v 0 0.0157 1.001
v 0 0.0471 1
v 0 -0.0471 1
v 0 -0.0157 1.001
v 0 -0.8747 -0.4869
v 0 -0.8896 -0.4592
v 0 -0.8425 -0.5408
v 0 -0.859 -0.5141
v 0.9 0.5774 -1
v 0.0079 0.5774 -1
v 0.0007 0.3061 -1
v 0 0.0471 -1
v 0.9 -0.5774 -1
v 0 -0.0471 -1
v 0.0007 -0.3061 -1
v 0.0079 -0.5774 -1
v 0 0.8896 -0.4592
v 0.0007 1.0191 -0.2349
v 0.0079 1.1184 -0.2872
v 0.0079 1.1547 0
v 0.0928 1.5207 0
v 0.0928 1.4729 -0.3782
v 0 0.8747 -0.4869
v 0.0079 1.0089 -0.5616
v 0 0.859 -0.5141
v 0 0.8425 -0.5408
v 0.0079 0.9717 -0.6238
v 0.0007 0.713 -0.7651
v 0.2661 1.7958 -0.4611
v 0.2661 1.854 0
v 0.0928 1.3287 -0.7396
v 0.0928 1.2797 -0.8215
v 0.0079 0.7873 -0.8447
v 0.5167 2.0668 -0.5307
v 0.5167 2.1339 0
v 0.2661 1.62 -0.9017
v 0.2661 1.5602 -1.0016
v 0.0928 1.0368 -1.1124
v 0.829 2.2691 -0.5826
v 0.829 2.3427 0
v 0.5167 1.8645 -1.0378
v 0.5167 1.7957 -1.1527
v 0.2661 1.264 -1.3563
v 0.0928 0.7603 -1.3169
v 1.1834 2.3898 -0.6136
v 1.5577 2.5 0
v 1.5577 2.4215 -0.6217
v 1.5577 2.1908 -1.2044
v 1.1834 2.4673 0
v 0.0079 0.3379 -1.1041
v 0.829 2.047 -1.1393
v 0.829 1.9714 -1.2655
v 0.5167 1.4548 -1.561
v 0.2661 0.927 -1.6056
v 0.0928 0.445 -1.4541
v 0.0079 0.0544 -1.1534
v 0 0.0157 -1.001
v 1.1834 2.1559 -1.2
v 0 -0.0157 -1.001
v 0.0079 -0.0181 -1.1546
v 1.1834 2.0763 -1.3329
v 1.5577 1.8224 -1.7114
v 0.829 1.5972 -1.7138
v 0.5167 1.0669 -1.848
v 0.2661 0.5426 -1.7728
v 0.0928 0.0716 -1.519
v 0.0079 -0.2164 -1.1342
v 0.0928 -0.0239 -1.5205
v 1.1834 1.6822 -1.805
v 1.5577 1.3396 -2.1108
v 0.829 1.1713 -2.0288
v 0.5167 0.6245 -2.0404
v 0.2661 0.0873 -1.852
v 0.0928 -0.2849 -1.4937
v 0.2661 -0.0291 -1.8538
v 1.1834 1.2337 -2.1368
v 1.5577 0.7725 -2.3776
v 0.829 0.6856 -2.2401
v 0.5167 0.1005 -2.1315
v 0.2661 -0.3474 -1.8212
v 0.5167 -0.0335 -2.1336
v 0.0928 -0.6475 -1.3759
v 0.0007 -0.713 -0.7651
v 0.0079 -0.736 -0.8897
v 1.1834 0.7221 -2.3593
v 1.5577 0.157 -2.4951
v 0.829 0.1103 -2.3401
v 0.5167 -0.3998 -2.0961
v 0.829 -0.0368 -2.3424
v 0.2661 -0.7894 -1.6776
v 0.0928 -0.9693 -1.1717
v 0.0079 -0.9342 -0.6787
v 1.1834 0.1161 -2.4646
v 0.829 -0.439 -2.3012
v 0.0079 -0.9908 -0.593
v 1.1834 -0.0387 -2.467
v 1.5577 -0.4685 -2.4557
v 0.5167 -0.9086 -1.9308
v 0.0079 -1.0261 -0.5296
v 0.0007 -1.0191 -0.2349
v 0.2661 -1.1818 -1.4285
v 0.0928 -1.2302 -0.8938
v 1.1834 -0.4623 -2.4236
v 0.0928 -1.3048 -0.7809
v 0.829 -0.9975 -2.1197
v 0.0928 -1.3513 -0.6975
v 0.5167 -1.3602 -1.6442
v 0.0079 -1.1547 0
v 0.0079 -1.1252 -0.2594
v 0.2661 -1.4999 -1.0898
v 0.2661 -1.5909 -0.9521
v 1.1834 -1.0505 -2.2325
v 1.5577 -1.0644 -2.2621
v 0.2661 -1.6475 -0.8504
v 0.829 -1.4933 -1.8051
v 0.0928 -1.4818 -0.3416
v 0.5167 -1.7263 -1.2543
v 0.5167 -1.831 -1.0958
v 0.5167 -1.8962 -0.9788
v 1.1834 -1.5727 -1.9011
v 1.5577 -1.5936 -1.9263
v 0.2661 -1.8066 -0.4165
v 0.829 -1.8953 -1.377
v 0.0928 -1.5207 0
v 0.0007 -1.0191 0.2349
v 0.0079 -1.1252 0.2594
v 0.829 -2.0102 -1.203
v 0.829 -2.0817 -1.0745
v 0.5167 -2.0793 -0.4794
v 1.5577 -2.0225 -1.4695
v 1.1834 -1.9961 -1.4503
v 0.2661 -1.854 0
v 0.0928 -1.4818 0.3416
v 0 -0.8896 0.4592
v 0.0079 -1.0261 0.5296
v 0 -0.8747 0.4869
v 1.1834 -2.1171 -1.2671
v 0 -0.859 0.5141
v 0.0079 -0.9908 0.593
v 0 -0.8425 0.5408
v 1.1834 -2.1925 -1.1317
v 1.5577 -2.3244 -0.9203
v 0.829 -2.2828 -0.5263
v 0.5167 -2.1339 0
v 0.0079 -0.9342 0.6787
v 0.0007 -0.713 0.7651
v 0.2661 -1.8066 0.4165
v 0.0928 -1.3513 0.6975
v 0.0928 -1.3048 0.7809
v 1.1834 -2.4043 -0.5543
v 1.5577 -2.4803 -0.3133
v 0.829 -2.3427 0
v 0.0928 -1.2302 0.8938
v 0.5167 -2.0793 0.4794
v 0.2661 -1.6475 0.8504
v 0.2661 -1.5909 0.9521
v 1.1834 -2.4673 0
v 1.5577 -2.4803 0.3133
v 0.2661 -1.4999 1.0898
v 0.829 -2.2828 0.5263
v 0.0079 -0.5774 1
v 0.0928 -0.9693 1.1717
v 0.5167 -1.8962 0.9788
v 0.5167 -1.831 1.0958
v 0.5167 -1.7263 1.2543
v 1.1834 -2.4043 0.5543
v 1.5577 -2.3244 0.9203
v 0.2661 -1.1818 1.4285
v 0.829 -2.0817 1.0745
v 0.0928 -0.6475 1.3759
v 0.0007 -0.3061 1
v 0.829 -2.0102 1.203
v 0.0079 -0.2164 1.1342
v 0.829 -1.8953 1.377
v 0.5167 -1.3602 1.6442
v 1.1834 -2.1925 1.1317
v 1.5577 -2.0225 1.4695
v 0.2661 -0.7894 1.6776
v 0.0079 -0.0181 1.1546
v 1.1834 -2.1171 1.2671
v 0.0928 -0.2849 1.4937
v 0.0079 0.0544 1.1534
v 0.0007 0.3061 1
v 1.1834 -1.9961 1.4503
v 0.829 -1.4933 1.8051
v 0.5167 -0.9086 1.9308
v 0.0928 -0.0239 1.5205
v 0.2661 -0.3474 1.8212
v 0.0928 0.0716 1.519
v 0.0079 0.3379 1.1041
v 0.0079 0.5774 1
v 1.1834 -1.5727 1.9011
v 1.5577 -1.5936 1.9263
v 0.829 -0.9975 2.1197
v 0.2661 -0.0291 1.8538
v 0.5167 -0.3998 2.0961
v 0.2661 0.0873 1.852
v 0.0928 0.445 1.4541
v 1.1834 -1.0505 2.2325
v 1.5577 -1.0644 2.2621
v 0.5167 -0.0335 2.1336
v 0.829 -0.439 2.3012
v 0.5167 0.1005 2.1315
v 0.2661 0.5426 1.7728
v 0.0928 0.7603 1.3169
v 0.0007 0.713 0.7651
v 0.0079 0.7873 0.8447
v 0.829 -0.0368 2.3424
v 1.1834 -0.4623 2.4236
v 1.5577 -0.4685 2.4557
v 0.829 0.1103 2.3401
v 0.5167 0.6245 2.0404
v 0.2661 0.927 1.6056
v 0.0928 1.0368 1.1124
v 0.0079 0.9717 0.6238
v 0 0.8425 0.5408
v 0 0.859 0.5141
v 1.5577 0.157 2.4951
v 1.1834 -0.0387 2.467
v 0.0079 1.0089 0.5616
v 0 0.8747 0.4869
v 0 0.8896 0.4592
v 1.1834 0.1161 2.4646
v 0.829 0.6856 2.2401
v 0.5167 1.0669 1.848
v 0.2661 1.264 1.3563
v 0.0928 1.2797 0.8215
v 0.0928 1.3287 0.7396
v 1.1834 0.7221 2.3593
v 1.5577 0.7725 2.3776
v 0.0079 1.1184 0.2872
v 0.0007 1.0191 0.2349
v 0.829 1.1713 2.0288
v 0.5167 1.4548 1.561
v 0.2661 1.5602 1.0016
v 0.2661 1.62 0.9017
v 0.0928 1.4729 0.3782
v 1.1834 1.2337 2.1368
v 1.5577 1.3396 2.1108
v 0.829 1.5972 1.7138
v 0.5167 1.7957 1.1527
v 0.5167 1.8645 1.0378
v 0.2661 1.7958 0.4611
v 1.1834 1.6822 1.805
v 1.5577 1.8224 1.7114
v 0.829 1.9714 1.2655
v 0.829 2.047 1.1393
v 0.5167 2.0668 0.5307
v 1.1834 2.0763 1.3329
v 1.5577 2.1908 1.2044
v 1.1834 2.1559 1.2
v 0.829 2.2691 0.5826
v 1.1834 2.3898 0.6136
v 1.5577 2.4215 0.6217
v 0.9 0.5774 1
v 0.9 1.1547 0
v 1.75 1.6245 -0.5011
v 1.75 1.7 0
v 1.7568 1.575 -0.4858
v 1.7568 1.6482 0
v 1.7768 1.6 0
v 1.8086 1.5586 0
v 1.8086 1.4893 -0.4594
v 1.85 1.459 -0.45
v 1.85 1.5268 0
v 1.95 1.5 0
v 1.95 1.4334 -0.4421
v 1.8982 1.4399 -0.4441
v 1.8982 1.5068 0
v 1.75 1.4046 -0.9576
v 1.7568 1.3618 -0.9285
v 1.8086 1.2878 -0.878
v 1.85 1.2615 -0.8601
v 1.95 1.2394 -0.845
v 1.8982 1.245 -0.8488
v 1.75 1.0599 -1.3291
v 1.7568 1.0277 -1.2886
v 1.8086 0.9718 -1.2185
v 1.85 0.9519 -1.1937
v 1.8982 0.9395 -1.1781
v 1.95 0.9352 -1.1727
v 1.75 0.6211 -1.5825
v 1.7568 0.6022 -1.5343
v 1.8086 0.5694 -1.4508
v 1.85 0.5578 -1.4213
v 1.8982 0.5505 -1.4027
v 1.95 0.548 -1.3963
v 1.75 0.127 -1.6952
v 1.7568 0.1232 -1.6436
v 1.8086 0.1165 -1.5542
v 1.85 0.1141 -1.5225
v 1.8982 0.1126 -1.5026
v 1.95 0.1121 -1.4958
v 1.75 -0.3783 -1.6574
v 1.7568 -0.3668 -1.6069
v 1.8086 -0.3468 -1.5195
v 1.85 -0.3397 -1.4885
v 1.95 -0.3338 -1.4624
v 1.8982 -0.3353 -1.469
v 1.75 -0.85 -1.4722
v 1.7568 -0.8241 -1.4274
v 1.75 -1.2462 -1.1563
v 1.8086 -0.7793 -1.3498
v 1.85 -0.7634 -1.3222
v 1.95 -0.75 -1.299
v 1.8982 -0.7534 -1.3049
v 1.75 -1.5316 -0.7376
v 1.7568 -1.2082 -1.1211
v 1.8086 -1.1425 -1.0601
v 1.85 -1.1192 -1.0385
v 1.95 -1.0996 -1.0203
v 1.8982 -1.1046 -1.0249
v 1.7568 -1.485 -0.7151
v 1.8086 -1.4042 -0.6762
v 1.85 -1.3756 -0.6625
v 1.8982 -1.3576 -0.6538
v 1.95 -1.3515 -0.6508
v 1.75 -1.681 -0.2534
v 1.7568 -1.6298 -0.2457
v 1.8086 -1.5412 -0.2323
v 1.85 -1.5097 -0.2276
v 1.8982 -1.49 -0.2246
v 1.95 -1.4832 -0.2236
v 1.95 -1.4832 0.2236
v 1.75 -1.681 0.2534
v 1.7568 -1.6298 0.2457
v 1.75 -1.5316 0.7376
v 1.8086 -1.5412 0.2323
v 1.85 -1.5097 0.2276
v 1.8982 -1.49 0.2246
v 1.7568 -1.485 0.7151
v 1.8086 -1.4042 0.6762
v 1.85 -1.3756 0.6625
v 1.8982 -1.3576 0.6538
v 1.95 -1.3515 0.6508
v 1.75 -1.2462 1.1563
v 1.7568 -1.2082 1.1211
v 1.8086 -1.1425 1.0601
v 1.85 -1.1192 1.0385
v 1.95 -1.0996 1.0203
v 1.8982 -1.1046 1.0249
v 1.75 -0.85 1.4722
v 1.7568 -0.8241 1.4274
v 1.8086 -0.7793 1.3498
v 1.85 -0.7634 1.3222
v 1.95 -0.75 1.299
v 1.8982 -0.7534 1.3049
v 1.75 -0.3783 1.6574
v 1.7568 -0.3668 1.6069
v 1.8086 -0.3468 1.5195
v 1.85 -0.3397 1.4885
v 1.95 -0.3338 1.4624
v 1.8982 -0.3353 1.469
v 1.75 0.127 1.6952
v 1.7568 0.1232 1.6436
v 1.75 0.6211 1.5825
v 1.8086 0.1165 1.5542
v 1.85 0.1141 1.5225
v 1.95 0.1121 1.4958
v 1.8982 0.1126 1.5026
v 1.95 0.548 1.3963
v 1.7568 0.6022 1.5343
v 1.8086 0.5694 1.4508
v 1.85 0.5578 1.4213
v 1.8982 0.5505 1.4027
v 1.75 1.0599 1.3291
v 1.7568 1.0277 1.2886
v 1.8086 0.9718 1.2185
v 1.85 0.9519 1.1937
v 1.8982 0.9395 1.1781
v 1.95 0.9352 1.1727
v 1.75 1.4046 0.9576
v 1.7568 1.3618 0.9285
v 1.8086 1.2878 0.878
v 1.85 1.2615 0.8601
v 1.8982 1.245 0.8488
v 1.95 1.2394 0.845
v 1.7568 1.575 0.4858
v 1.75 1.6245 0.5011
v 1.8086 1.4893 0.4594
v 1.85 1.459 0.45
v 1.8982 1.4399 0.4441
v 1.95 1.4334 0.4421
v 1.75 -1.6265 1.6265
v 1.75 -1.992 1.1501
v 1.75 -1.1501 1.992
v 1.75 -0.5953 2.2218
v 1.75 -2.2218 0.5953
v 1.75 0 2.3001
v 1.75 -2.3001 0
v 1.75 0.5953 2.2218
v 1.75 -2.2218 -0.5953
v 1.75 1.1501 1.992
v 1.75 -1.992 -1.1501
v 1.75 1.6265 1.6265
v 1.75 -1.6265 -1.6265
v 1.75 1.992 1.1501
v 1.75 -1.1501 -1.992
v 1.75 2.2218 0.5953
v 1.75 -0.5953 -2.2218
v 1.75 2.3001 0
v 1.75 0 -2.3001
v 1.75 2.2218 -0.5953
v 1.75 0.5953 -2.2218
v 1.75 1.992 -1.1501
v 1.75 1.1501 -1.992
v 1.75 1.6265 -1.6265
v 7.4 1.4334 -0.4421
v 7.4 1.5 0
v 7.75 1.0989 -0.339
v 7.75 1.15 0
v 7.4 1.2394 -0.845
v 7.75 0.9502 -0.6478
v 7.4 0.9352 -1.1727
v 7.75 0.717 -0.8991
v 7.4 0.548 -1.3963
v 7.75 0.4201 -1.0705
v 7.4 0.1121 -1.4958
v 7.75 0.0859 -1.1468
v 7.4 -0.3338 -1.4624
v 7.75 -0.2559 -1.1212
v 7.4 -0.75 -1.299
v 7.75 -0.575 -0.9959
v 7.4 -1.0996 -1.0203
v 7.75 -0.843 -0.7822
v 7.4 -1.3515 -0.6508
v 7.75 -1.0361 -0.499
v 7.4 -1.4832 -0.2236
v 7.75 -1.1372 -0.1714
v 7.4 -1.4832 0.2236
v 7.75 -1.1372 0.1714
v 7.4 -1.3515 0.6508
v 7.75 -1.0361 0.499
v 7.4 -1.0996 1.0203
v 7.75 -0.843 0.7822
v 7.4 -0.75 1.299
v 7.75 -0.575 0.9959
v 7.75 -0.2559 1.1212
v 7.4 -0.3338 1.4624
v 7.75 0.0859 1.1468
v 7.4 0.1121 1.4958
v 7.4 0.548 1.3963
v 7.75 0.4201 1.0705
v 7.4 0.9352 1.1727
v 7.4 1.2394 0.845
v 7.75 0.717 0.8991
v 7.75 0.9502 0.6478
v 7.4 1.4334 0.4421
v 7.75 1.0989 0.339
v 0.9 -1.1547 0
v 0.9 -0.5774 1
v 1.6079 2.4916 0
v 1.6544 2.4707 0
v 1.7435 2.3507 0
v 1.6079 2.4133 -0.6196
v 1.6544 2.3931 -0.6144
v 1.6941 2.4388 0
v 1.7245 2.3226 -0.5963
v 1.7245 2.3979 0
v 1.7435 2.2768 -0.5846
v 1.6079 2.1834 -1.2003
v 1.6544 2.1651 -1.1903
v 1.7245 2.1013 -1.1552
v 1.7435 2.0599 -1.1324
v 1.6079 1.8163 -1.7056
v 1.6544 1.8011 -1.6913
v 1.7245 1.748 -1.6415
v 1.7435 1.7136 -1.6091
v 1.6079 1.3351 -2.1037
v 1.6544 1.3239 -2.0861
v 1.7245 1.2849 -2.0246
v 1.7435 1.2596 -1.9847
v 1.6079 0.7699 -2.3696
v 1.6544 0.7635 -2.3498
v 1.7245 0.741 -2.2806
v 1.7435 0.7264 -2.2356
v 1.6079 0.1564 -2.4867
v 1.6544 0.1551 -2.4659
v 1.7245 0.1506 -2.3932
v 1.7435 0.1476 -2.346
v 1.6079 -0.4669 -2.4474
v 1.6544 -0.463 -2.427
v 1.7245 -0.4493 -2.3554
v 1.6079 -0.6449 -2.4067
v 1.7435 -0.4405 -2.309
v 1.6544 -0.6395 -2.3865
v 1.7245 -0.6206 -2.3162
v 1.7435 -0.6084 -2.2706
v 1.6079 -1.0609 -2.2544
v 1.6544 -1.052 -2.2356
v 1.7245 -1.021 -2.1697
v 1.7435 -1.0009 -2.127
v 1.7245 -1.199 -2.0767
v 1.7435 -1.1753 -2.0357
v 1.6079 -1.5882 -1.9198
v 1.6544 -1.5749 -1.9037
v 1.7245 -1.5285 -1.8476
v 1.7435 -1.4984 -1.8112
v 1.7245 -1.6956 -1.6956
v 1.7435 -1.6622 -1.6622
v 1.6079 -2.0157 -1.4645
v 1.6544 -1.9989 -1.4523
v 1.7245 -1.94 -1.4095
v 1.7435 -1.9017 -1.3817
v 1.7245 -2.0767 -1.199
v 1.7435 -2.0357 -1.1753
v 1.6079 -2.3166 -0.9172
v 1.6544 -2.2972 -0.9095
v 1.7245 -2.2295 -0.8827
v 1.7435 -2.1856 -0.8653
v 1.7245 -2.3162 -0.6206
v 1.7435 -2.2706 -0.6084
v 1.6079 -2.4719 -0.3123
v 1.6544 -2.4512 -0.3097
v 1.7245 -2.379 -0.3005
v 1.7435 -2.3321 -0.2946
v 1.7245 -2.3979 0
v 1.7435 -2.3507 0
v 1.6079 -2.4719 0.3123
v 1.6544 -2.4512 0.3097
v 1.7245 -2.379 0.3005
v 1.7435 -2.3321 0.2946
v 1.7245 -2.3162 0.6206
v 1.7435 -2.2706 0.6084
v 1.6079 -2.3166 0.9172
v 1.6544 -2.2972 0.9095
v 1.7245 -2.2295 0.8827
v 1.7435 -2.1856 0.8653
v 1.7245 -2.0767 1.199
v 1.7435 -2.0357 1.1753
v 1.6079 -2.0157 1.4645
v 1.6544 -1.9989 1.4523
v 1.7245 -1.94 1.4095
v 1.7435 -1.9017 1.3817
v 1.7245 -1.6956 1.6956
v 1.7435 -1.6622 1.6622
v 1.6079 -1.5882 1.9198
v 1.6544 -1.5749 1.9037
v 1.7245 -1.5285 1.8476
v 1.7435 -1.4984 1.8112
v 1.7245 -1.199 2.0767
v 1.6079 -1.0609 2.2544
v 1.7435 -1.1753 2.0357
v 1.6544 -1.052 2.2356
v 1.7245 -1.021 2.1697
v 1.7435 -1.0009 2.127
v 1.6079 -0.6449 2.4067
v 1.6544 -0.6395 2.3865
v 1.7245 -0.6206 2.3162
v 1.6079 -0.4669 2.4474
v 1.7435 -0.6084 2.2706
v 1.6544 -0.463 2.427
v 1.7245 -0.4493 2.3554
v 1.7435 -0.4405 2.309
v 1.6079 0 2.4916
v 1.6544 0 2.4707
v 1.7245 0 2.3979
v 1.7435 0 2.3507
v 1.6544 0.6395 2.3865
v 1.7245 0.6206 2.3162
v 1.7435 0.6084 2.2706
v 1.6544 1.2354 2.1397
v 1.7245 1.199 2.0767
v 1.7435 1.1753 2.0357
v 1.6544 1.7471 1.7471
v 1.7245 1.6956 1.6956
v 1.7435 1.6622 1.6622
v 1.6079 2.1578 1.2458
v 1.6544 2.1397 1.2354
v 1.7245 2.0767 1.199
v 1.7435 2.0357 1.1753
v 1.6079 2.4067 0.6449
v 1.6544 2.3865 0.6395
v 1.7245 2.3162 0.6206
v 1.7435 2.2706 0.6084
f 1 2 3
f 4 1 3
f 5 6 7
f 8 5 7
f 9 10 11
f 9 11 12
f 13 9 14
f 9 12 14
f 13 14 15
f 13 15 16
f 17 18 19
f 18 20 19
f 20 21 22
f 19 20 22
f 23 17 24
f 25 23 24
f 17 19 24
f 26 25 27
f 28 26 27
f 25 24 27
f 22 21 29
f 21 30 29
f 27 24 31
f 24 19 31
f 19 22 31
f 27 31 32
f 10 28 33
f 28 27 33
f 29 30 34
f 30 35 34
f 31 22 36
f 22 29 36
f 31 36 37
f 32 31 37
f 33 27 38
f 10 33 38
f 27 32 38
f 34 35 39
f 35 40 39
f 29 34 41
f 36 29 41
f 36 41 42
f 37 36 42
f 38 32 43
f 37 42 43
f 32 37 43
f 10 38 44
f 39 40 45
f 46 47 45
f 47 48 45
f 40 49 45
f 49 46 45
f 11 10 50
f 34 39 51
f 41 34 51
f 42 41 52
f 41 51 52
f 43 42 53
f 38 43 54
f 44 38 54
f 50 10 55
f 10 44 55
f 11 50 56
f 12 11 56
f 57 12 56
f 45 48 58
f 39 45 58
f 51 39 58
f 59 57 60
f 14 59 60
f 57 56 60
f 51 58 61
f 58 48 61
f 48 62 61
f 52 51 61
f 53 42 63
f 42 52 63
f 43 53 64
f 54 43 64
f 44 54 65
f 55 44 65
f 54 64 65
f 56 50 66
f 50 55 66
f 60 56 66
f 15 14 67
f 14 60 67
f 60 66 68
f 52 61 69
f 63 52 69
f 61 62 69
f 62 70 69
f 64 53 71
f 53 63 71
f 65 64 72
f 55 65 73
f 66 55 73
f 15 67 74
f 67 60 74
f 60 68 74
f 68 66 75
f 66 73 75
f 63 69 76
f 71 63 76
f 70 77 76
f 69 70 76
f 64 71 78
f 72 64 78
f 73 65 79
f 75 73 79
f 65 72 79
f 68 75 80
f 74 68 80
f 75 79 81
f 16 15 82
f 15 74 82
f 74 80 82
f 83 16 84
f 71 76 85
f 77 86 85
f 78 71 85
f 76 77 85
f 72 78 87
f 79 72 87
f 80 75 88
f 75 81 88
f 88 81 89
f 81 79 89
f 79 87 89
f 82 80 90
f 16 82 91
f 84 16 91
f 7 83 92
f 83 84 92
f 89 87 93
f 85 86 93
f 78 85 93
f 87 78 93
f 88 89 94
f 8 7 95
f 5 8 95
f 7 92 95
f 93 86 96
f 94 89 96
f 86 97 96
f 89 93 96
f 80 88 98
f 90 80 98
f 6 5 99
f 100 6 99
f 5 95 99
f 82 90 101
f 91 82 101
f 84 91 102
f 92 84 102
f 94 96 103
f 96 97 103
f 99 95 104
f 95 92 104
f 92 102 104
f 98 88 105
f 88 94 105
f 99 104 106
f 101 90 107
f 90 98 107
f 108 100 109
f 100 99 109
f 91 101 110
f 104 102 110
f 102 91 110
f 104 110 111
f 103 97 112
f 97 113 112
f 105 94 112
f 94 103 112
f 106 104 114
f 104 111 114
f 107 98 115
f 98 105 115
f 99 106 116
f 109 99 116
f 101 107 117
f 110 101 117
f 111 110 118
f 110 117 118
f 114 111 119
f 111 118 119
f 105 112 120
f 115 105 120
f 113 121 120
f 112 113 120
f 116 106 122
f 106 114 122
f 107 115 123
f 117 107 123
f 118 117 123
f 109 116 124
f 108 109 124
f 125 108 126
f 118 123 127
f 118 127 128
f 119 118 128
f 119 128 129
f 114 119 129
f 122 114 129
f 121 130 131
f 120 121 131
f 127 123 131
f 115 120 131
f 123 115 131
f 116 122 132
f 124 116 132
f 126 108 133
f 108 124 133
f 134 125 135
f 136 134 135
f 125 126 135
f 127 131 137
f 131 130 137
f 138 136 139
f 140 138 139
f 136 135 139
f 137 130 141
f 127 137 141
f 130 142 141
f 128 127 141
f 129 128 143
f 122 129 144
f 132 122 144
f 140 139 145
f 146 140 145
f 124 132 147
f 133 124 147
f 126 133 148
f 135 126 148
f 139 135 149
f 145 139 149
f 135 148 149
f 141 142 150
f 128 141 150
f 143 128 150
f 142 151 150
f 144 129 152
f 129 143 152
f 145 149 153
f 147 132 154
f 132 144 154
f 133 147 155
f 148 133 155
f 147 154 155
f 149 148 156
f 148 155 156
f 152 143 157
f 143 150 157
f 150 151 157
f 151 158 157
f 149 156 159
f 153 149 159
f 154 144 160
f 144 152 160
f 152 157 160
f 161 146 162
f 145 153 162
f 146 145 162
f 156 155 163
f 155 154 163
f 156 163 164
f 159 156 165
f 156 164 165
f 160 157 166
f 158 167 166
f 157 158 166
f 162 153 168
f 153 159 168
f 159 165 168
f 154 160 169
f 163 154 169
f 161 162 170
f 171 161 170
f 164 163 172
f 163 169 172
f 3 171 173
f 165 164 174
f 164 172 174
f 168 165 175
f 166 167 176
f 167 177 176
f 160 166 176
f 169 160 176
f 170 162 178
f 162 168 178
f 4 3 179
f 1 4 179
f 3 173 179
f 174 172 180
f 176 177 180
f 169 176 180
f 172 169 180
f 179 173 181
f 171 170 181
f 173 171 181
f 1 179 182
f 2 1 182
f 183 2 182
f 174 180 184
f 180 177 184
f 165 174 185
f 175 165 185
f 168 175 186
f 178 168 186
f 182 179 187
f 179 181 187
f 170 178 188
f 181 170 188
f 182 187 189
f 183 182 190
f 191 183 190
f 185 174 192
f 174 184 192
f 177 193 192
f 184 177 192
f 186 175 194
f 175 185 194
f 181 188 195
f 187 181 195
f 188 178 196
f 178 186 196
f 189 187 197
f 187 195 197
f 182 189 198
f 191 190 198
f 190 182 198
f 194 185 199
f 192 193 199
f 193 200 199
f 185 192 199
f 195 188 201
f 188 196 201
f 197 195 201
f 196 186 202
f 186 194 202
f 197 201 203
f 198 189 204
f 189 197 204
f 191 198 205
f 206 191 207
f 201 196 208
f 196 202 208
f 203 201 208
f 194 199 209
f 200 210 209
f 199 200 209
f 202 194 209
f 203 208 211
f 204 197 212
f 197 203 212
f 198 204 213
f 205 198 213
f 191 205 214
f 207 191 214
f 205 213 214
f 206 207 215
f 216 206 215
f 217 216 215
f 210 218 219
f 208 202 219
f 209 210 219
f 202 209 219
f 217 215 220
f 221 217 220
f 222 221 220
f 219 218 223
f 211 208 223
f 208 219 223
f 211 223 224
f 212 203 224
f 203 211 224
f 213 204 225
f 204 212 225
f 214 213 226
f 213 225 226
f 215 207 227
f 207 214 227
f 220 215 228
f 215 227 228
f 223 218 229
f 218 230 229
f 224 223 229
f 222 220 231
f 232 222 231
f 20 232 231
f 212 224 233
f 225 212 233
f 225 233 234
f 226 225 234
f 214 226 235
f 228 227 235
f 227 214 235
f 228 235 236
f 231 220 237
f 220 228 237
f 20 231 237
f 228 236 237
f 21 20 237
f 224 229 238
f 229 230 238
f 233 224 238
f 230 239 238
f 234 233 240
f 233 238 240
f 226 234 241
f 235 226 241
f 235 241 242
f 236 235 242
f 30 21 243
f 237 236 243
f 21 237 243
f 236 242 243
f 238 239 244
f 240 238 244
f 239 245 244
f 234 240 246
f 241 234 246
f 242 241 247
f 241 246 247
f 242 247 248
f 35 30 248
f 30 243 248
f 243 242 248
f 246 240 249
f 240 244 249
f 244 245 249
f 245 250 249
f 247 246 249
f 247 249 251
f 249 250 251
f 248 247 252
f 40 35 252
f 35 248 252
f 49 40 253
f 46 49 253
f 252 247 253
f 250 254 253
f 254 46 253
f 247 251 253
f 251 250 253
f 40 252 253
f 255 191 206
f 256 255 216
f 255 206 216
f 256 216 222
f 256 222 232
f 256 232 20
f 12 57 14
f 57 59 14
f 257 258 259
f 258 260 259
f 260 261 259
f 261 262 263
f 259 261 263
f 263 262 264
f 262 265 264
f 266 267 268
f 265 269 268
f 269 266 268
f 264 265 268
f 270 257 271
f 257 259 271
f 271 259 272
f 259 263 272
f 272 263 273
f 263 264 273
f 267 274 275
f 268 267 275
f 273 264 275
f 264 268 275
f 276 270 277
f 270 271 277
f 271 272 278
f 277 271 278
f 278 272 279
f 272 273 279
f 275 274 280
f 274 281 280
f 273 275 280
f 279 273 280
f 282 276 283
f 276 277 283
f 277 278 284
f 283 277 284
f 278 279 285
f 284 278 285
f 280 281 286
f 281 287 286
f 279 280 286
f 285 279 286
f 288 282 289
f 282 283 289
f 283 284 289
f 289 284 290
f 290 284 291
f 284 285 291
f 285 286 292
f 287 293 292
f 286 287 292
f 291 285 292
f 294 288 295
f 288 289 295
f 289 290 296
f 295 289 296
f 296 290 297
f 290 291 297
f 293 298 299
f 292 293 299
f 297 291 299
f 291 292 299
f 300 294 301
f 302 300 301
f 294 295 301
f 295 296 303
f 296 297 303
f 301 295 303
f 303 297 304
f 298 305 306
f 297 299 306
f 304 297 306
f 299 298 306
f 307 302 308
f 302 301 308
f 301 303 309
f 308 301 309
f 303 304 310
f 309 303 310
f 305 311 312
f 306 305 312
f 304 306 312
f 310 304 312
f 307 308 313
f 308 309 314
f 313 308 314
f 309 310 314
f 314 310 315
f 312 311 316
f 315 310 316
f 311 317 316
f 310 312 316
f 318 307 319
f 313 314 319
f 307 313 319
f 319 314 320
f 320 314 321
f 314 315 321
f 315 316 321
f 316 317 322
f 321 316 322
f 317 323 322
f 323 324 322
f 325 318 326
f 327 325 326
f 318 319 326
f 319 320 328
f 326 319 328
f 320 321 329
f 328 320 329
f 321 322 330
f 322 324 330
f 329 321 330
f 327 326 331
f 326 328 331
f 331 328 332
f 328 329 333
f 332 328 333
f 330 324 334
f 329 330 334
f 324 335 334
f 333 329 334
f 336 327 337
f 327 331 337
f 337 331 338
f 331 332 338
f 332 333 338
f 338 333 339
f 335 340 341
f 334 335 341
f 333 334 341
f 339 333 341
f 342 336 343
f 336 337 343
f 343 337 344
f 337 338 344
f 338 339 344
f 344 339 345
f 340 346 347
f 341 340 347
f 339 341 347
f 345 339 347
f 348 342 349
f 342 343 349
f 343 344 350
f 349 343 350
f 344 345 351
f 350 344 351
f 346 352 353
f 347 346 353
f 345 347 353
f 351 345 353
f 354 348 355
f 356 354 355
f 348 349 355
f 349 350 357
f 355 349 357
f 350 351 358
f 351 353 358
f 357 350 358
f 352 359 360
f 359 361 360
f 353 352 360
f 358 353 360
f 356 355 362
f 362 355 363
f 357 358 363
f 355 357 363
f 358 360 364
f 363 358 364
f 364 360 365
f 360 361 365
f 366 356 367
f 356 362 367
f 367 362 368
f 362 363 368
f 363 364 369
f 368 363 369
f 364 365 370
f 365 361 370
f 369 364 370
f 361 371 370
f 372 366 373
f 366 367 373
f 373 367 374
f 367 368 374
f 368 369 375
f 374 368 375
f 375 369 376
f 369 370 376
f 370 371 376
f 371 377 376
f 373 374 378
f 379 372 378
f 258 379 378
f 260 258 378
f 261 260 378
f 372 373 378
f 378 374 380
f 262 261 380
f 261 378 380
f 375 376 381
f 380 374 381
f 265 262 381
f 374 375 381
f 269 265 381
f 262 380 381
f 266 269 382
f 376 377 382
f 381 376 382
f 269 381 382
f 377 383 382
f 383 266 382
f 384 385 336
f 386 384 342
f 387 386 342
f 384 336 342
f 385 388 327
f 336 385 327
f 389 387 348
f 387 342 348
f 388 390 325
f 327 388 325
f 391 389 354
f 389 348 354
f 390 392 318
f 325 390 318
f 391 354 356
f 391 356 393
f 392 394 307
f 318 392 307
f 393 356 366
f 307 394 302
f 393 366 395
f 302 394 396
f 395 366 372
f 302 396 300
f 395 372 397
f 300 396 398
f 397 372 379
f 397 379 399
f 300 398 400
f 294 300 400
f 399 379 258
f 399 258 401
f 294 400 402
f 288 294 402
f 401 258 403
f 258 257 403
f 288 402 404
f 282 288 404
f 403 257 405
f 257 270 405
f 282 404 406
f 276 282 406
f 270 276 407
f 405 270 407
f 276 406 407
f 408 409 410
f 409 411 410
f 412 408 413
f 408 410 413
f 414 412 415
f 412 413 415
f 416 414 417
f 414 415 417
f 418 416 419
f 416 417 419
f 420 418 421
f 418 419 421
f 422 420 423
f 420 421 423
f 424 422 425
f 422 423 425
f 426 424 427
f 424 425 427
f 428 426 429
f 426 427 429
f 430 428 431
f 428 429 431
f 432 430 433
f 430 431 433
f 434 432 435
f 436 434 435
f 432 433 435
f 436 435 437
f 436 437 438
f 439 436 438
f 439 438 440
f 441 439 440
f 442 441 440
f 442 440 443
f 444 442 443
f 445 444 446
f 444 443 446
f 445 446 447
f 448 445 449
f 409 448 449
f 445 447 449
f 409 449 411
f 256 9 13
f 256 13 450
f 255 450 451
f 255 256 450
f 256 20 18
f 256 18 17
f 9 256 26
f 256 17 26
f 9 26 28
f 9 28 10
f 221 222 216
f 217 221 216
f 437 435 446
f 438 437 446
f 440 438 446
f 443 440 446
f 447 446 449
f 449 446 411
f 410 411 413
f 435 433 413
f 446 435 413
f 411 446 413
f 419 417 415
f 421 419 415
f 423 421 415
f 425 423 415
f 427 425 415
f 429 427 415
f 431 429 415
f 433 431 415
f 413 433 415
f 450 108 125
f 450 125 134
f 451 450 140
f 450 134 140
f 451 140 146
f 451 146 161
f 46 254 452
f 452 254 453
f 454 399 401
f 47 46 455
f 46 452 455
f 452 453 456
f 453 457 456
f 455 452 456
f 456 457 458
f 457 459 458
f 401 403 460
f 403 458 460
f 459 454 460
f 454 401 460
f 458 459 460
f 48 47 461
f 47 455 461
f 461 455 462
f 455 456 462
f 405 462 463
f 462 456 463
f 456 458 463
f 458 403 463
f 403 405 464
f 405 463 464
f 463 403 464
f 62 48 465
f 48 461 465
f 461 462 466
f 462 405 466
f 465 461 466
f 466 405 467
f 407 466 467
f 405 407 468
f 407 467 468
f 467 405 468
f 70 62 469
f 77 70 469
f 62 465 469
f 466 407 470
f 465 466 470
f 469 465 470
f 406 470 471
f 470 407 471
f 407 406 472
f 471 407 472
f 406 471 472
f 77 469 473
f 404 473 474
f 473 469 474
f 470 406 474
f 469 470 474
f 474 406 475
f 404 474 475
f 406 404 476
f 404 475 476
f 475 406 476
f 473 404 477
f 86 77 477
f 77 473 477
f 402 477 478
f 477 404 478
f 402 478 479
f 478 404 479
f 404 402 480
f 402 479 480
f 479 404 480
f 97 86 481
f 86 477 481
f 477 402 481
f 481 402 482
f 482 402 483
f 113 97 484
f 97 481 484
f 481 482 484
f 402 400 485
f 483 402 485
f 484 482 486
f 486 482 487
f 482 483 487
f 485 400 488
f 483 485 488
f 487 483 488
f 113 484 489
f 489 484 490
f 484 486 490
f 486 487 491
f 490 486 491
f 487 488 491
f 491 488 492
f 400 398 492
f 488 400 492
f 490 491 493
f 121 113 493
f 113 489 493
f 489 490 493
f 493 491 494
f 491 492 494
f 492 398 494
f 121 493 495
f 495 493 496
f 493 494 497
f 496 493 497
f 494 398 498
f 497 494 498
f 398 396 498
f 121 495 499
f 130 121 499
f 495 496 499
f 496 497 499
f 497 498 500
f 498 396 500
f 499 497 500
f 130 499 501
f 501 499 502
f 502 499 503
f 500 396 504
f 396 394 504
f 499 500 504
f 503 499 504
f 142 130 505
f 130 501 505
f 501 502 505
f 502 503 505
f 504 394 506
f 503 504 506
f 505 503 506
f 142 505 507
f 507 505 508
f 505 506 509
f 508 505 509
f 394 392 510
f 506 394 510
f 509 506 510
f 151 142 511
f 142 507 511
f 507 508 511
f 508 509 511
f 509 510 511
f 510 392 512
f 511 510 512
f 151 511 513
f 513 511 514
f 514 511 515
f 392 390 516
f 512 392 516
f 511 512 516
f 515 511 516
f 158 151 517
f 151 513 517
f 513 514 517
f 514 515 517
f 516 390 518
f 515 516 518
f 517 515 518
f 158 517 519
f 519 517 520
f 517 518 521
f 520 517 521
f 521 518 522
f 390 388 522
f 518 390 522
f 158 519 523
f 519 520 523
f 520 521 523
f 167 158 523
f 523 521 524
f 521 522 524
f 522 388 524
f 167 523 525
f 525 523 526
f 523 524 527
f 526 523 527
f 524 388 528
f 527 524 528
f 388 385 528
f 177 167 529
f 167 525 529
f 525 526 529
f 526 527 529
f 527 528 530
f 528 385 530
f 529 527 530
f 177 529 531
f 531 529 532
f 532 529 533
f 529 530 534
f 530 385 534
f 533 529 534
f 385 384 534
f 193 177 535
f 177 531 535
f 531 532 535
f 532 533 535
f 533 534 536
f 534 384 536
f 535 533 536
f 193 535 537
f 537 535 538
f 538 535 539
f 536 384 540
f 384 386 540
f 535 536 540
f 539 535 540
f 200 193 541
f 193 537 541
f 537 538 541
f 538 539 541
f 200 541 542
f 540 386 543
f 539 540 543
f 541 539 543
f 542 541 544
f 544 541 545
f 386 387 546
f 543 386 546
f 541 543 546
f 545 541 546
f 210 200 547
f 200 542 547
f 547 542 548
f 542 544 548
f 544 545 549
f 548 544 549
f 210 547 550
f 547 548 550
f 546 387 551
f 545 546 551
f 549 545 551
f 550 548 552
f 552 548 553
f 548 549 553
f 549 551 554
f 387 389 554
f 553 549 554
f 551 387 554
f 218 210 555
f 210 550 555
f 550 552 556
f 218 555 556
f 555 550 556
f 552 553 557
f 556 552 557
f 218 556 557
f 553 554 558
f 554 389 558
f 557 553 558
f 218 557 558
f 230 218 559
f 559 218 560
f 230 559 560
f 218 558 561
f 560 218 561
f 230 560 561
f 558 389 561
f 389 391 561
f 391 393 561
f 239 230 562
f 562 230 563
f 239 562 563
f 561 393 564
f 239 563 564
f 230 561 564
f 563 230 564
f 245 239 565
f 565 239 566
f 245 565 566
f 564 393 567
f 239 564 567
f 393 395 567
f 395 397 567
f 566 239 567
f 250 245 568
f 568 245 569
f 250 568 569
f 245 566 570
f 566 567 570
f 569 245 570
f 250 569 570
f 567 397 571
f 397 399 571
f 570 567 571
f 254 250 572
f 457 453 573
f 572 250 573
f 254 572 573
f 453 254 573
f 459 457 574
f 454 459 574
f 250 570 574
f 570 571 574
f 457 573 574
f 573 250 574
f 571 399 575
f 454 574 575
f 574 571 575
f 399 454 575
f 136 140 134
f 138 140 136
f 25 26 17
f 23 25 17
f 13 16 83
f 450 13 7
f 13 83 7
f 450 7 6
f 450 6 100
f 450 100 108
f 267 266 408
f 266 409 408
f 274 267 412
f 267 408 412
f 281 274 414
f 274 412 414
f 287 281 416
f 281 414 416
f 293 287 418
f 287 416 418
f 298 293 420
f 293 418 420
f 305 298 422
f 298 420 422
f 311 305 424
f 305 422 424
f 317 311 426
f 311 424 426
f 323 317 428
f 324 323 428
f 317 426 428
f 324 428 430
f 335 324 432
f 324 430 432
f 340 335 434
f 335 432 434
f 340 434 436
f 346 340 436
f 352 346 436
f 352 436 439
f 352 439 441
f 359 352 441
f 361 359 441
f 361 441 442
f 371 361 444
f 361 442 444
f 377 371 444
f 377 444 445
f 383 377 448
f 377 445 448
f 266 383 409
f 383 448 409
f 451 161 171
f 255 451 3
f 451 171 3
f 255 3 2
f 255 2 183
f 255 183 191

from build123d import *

# Parameters (mm, degrees)
CUT_EXTRUDE1_DEPTH = 0.9


with BuildPart() as part:
    # Sketch1 → Revolve1 (revolve)
    with BuildSketch(Plane.XY):
        with BuildLine():
            Line((0, 0), (0, 1.001109878))
            ThreePointArc((0, 1.001109878), (0.459937132, 2.081974916), (1.557692308, 2.5))
            ThreePointArc((1.557692308, 2.5), (1.694115338, 2.438823033), (1.75, 2.300147984))
            Line((1.75, 2.300147984), (1.75, 1.7))
            ThreePointArc((1.75, 1.7), (1.808578644, 1.558578644), (1.95, 1.5))
            Line((1.95, 1.5), (7.4, 1.5))
            Line((7.4, 1.5), (7.75, 1.15))
            Line((7.75, 1.15), (7.75, 0))
            Line((7.75, 0), (0, 0))
        make_face()
    revolve(axis=Axis((0, 0, 0), (-1, 0, 0)))

    # Sketch2 → Cut-Extrude1 (cut)
    with BuildSketch(Plane.ZY):
        Polygon((1, -0.577350269), (1, 0.577350269), (0, 1.154700538), (-1, 0.577350269), (-1, -0.577350269), (0, -1.154700538), align=None)
    extrude(amount=-CUT_EXTRUDE1_DEPTH, mode=Mode.SUBTRACT)


solid = part.part
